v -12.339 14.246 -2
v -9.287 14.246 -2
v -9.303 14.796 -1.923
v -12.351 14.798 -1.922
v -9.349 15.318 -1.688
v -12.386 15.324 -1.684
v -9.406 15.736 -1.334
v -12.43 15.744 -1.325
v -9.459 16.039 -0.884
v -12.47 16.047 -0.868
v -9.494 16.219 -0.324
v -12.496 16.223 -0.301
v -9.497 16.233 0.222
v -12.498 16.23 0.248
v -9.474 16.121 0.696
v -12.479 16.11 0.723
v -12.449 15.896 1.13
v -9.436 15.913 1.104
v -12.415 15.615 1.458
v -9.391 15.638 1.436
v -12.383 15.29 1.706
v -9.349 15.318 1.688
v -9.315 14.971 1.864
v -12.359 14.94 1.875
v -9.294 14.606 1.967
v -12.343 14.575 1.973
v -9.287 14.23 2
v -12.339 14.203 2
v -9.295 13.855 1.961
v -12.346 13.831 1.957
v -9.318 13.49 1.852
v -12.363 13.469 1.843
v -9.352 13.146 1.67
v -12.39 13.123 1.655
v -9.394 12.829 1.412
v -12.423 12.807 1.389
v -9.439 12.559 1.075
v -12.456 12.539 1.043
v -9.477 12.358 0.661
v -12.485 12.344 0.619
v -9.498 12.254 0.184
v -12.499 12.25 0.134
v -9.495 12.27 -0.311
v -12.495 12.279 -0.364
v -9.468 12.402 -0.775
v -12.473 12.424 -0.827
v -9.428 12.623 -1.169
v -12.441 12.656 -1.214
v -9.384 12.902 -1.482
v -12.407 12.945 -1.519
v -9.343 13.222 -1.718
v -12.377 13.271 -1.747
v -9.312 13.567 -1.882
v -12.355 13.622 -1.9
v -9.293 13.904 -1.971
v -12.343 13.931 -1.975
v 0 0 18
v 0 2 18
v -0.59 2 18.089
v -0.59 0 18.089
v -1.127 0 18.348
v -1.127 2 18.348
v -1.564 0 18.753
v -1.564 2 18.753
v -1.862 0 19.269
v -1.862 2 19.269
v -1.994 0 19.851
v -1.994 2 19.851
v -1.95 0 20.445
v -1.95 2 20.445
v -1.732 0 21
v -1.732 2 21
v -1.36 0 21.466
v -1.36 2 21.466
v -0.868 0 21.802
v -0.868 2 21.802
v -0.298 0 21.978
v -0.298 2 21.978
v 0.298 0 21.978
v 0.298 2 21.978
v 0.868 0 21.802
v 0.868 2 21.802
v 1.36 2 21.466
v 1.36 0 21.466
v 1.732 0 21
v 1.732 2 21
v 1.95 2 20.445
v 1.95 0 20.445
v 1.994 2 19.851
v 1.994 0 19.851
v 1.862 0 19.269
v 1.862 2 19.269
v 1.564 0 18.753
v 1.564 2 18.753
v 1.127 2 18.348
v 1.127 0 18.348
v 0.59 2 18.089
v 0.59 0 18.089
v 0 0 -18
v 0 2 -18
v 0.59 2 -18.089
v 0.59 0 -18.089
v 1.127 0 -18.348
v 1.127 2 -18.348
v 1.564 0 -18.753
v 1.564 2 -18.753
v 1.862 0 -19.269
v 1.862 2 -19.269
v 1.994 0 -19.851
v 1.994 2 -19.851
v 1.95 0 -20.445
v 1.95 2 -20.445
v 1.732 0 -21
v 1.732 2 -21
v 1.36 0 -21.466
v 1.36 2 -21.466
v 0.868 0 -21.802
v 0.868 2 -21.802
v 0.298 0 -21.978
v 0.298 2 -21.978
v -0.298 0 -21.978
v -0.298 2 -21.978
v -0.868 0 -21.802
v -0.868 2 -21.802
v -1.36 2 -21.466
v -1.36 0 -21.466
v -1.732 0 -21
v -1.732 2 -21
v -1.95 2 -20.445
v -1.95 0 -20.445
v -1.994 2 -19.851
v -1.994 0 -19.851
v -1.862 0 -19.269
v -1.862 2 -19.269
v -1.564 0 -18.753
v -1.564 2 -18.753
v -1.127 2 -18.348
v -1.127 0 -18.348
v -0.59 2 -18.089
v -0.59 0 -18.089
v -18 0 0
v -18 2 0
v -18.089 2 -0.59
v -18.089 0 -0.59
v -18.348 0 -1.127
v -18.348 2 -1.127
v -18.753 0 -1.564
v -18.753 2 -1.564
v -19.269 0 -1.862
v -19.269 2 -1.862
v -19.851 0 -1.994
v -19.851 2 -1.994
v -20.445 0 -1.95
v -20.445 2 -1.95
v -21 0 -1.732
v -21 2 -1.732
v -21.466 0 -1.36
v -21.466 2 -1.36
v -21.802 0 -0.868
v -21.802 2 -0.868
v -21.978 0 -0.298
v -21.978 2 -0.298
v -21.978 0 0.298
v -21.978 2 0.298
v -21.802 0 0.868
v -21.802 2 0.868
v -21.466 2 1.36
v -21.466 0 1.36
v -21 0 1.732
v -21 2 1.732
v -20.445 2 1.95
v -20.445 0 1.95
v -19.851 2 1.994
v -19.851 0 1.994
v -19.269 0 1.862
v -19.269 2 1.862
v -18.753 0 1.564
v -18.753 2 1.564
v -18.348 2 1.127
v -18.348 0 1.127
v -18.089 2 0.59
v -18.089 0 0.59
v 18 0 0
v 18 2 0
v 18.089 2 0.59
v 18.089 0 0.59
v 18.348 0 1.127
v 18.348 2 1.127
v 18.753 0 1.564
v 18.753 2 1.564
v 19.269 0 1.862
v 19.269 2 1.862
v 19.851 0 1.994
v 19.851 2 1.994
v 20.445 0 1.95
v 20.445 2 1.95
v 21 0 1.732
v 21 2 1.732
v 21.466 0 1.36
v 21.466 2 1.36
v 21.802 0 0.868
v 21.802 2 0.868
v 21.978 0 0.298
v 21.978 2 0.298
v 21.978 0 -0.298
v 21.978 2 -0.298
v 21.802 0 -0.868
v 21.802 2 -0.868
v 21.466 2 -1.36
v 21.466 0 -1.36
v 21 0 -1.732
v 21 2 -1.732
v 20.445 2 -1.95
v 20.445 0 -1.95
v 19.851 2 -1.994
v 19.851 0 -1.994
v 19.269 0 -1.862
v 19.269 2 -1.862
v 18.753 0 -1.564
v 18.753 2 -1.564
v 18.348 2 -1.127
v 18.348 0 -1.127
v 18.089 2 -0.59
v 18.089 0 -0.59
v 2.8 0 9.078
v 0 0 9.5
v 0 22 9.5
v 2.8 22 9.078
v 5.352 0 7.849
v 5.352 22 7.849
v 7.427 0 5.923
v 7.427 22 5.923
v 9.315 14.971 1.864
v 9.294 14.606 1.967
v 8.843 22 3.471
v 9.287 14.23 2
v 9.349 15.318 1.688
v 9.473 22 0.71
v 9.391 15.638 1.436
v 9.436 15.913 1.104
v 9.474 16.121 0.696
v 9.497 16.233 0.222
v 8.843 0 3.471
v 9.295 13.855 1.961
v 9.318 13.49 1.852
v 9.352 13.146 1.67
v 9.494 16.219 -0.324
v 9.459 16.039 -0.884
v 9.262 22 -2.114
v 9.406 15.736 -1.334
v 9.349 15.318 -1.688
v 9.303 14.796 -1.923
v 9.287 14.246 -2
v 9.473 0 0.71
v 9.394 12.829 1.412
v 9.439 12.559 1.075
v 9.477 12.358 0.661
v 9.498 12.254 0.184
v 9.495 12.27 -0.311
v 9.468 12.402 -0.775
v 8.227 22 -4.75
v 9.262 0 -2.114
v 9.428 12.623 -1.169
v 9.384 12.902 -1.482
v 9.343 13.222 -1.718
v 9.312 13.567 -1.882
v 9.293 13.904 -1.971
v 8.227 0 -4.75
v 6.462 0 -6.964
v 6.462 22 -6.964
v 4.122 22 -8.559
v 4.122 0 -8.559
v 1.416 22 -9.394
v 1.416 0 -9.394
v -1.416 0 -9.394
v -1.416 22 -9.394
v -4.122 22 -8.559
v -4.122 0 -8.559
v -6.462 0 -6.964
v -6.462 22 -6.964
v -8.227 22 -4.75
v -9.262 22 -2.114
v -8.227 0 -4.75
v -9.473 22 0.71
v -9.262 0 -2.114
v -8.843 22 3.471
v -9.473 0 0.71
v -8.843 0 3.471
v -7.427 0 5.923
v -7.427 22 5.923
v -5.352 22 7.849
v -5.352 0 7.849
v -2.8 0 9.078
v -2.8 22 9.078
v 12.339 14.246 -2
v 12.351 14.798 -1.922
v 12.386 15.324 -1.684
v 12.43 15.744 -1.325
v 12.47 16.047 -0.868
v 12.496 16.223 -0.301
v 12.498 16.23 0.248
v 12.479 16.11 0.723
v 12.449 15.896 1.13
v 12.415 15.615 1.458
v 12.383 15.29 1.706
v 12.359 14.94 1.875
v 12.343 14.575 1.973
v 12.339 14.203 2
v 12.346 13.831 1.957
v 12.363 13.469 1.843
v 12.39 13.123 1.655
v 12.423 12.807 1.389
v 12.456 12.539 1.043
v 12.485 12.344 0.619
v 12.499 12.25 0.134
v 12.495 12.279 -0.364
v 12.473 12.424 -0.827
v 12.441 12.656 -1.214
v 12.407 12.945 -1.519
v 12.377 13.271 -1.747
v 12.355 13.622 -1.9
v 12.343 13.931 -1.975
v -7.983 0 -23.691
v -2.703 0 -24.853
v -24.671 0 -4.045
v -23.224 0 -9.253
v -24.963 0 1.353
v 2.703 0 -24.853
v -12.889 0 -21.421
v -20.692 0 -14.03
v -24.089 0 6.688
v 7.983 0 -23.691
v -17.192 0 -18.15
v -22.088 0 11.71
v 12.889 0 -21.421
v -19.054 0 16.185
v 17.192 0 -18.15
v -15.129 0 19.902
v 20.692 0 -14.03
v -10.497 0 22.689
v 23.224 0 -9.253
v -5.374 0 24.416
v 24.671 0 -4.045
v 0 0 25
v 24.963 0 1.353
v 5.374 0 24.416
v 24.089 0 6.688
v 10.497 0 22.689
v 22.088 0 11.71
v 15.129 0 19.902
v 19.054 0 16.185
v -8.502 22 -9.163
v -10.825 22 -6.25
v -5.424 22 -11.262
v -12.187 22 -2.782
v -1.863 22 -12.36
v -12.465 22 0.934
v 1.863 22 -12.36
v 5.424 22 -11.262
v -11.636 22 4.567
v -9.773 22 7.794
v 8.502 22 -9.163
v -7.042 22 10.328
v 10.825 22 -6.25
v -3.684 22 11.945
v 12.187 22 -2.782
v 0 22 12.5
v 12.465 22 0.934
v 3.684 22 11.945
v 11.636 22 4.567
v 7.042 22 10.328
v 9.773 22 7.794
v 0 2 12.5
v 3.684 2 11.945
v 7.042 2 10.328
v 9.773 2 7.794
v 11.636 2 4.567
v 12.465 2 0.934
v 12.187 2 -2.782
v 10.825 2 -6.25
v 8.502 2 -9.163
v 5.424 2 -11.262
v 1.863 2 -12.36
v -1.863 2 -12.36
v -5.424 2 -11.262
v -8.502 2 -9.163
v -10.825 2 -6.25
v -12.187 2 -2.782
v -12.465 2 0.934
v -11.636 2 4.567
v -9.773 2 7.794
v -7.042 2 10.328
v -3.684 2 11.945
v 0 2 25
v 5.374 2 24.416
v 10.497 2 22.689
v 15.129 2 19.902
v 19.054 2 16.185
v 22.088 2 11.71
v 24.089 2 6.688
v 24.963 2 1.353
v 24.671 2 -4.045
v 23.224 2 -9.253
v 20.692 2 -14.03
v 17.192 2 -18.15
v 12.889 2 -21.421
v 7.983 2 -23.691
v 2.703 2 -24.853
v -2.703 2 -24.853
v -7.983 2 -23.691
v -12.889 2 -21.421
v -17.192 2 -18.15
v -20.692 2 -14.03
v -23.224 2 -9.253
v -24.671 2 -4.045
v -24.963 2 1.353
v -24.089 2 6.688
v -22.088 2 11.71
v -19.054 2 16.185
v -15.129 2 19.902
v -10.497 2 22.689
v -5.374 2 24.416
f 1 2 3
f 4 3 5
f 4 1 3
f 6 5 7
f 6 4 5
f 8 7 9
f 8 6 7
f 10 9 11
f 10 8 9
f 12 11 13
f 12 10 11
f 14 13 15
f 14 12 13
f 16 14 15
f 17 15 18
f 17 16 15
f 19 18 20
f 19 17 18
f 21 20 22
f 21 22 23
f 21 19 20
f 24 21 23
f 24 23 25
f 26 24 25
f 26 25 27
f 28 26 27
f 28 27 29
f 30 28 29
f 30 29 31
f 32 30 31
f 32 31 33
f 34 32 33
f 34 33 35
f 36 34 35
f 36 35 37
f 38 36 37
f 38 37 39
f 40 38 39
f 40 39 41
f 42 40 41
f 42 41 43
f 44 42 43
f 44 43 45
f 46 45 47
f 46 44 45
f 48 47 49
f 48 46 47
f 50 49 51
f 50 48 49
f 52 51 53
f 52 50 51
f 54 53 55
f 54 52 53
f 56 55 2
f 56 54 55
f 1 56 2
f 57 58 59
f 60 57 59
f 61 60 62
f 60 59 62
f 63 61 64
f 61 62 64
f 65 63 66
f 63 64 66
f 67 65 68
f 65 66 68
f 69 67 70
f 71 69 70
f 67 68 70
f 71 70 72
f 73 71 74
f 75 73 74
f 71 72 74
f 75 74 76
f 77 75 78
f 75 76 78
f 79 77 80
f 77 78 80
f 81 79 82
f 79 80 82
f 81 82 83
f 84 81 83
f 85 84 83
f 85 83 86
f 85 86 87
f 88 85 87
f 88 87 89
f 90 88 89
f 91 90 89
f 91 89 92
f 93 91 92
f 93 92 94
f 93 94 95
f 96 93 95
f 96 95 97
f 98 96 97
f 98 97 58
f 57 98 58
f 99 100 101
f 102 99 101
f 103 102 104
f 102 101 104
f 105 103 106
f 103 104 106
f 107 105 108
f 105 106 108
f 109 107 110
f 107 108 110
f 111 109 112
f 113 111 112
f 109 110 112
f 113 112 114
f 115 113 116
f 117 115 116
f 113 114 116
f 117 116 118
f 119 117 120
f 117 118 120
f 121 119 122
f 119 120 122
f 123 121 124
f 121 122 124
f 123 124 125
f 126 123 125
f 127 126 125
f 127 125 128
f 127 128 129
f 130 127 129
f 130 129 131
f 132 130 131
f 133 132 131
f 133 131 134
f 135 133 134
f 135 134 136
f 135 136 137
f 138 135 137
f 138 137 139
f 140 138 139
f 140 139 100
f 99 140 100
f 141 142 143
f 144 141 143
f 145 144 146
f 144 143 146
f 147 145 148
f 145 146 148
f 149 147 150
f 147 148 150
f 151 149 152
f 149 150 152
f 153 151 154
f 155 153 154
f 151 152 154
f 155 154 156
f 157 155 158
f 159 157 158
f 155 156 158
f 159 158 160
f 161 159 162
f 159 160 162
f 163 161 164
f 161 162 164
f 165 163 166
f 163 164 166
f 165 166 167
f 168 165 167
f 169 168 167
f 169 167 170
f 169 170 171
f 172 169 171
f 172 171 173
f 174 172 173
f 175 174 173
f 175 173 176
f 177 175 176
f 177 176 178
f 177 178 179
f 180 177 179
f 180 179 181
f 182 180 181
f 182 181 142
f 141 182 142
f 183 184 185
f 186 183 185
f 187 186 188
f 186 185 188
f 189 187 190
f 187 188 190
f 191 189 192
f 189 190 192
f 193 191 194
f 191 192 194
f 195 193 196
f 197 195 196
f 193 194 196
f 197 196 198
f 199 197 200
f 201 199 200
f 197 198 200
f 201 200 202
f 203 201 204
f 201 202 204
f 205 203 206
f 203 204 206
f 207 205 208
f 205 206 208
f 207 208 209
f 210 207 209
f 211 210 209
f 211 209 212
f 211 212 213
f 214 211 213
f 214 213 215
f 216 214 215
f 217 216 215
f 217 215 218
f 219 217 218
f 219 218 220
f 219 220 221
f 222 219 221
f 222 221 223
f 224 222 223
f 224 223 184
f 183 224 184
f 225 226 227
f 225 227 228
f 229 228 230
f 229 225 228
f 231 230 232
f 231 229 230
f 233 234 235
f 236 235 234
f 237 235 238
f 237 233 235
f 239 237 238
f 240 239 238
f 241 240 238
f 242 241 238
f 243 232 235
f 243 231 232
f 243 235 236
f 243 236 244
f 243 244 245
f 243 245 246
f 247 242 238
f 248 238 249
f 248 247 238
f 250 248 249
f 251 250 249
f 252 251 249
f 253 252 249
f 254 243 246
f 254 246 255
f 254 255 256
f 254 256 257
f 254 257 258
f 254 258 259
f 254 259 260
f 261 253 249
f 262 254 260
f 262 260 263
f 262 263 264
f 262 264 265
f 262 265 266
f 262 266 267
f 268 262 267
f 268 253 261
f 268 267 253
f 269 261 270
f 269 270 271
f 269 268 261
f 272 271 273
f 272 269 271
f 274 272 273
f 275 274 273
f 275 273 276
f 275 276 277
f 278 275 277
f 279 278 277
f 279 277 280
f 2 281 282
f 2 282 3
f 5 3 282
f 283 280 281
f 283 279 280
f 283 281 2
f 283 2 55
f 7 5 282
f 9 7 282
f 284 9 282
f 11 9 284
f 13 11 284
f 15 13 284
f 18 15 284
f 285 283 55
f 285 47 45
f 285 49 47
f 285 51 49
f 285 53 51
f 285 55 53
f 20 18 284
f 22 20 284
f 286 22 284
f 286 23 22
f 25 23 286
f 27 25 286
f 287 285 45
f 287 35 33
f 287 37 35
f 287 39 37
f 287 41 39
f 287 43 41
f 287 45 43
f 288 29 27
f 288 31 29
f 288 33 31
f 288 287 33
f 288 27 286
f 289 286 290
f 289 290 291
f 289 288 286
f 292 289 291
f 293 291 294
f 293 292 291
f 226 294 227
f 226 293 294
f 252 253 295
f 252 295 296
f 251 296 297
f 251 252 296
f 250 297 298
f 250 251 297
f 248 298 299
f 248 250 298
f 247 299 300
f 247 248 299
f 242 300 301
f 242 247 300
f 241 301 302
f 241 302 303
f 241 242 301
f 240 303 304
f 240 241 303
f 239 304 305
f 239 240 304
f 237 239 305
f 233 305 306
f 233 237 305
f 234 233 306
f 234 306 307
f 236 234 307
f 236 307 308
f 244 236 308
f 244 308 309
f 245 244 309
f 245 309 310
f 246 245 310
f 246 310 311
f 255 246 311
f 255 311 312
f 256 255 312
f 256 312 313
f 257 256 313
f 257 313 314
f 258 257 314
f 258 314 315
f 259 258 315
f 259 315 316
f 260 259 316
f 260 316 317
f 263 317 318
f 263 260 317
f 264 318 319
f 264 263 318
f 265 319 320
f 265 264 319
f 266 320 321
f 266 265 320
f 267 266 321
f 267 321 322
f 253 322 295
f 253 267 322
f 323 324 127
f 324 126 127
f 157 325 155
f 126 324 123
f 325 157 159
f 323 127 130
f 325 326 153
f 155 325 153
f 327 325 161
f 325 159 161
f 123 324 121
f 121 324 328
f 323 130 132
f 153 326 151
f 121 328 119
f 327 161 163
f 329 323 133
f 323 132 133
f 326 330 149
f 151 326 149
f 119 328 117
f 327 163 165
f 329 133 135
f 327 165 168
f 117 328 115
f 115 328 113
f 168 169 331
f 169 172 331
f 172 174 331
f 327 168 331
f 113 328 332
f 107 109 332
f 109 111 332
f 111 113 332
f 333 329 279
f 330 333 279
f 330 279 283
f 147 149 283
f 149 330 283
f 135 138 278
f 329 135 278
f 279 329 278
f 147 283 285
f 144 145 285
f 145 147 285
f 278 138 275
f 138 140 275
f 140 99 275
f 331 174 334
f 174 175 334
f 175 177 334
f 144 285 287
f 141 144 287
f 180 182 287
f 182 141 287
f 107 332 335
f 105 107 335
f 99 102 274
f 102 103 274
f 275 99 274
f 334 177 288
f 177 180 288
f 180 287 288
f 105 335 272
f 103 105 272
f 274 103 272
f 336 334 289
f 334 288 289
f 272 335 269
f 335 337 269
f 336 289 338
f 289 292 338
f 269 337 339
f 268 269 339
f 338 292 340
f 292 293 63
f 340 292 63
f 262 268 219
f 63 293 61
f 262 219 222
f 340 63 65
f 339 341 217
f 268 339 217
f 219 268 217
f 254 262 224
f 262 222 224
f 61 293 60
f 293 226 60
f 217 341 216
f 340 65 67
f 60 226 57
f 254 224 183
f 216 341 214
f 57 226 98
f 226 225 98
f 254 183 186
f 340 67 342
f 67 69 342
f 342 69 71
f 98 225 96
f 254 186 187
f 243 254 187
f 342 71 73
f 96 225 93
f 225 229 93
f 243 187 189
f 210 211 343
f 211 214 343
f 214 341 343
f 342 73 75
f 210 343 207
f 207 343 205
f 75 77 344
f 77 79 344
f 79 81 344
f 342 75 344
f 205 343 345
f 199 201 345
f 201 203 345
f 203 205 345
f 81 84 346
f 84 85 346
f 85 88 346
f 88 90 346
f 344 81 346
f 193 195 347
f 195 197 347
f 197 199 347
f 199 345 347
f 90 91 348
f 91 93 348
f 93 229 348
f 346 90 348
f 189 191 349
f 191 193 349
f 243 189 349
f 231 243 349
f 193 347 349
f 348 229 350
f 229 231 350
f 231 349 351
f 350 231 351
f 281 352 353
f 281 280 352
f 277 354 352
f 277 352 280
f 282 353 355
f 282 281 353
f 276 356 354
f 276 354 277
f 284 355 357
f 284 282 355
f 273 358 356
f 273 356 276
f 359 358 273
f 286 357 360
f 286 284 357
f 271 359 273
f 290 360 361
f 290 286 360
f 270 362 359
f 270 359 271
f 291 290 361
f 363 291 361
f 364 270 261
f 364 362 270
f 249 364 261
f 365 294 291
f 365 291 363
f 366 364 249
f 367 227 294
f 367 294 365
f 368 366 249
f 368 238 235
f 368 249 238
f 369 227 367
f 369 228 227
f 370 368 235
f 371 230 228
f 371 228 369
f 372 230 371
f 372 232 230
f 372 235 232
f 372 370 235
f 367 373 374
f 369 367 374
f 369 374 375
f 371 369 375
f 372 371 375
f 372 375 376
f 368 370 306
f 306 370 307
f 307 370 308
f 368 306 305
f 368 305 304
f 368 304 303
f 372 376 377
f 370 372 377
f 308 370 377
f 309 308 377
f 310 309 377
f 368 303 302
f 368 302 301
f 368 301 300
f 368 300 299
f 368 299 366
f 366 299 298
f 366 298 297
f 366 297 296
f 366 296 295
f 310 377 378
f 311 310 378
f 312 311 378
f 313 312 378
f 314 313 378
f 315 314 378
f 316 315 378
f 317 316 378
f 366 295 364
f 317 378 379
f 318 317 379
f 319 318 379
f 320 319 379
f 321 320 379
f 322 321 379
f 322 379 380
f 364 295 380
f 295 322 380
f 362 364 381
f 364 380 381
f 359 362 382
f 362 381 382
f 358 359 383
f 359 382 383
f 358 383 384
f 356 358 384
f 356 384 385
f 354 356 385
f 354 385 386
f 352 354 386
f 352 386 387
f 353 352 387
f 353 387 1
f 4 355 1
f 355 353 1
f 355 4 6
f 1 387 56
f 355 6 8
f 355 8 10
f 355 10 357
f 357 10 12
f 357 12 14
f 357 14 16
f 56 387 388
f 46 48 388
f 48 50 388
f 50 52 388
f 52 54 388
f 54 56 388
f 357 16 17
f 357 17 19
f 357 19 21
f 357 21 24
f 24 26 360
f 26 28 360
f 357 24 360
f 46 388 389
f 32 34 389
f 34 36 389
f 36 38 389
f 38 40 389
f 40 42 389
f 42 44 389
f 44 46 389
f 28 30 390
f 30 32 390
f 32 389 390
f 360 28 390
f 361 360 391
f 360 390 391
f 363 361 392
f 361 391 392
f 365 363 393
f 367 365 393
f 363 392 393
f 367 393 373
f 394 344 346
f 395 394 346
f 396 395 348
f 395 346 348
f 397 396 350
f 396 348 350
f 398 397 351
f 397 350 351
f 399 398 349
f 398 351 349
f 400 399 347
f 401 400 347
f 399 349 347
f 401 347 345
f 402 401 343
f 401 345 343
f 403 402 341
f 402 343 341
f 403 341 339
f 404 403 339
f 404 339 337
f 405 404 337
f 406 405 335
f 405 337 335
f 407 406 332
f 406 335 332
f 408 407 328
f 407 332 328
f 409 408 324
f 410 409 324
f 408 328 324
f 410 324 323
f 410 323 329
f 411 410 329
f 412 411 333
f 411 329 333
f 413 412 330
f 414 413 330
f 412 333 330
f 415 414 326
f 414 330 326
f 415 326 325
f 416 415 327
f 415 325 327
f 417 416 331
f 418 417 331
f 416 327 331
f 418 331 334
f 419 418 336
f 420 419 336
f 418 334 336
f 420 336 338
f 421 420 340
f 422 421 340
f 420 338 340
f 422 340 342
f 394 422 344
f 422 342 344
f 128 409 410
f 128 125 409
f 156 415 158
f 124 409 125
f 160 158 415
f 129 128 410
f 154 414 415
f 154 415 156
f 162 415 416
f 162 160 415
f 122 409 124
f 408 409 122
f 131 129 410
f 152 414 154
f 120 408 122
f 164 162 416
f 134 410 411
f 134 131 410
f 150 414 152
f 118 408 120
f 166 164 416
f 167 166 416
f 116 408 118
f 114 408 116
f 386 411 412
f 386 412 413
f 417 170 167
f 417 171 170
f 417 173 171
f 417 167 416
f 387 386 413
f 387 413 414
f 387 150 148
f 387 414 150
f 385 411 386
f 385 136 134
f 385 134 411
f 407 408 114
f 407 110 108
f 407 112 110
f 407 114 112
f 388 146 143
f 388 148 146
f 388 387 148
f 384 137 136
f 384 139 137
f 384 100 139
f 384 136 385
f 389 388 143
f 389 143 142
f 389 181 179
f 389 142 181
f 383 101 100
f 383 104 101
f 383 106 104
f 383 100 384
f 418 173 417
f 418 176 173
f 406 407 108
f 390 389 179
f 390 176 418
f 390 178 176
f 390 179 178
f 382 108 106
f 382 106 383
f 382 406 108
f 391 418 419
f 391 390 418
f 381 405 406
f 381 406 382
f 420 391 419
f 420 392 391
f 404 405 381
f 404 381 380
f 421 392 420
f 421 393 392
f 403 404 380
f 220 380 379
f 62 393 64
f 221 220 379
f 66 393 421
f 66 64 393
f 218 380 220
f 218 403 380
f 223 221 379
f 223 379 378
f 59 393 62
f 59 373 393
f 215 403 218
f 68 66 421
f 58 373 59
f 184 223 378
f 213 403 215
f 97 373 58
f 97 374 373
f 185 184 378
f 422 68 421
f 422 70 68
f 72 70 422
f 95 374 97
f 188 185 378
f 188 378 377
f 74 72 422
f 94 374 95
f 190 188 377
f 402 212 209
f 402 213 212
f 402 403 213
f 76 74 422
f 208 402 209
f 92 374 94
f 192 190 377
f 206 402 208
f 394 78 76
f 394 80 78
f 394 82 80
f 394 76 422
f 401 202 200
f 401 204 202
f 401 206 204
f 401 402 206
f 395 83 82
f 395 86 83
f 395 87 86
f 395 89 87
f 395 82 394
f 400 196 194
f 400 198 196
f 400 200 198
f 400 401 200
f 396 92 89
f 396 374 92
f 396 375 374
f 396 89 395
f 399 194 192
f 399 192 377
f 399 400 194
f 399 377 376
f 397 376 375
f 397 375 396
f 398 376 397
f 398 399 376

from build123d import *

# Parameters (mm, degrees)
SKETCH1_R               = 25
SKETCH1_R_2             = 9.5
BOSS_EXTRUDE1_DEPTH     = 2
SKETCH2_R               = 12.5
SKETCH2_R_2             = 9.5
BOSS_EXTRUDE2_DEPTH     = 20
SKETCH3_R               = 2
CUT_EXTRUDE1_DEPTH      = 25
CIRPATTERN1_COUNT       = 4
CUT_EXTRUDE2_DEPTH      = 42.641325627
CUT_EXTRUDE2_DEPTH_BACK = 42.641325627
SKETCH4_R               = 2


with BuildPart() as part:
    # Sketch1 → Boss-Extrude1 (new body)
    with BuildSketch(Plane(origin=(0, 0, 0), x_dir=(1, 0, 0), z_dir=(0, 1, 0))):
        with Locations(Location((0, 0, 0), (0, 0, 270))):
            Circle(SKETCH1_R)
        with Locations(Location((0, 0, 0), (0, 0, 270))):
            Circle(SKETCH1_R_2, mode=Mode.SUBTRACT)
    extrude(amount=BOSS_EXTRUDE1_DEPTH)

    # Sketch2 → Boss-Extrude2 (add)
    with BuildSketch(Plane(origin=(0, 2, 0), x_dir=(1, 0, 0), z_dir=(0, 1, 0))):
        with Locations(Location((0, 0, 0), (0, 0, 270))):
            Circle(SKETCH2_R)
        with Locations(Location((0, 0, 0), (0, 0, 270))):
            Circle(SKETCH2_R_2, mode=Mode.SUBTRACT)
    extrude(amount=BOSS_EXTRUDE2_DEPTH)

    # Sketch3 → Cut-Extrude1 (cut)
    with BuildSketch(Plane(origin=(0, 2, 0), x_dir=(1, 0, 0), z_dir=(0, 1, 0))):
        with Locations(Location((0, 20, 0), (0, 0, 270))):
            Circle(SKETCH3_R)
    cut_extrude1 = extrude(amount=-CUT_EXTRUDE1_DEPTH, mode=Mode.SUBTRACT)

    # CirPattern1: Cut-Extrude1 ×4 about axis
    cirpattern1_axis = Axis((0, 0, 0), (0, 1, 0))
    for i in range(1, CIRPATTERN1_COUNT):
        add(cut_extrude1.rotate(cirpattern1_axis, i * 360 / CIRPATTERN1_COUNT), mode=Mode.SUBTRACT)

    # Sketch4 → Cut-Extrude2 (cut, two sides: drawn at the far end of the back side and taken through both)
    with BuildSketch(Plane(origin=(0, 0, 0), x_dir=(0, 0, -1), z_dir=(1, 0, 0)).offset(-CUT_EXTRUDE2_DEPTH_BACK)):
        with Locations((0, 14.24552707)):
            Circle(SKETCH4_R)
    extrude(amount=CUT_EXTRUDE2_DEPTH + CUT_EXTRUDE2_DEPTH_BACK, mode=Mode.SUBTRACT)


solid = part.part
